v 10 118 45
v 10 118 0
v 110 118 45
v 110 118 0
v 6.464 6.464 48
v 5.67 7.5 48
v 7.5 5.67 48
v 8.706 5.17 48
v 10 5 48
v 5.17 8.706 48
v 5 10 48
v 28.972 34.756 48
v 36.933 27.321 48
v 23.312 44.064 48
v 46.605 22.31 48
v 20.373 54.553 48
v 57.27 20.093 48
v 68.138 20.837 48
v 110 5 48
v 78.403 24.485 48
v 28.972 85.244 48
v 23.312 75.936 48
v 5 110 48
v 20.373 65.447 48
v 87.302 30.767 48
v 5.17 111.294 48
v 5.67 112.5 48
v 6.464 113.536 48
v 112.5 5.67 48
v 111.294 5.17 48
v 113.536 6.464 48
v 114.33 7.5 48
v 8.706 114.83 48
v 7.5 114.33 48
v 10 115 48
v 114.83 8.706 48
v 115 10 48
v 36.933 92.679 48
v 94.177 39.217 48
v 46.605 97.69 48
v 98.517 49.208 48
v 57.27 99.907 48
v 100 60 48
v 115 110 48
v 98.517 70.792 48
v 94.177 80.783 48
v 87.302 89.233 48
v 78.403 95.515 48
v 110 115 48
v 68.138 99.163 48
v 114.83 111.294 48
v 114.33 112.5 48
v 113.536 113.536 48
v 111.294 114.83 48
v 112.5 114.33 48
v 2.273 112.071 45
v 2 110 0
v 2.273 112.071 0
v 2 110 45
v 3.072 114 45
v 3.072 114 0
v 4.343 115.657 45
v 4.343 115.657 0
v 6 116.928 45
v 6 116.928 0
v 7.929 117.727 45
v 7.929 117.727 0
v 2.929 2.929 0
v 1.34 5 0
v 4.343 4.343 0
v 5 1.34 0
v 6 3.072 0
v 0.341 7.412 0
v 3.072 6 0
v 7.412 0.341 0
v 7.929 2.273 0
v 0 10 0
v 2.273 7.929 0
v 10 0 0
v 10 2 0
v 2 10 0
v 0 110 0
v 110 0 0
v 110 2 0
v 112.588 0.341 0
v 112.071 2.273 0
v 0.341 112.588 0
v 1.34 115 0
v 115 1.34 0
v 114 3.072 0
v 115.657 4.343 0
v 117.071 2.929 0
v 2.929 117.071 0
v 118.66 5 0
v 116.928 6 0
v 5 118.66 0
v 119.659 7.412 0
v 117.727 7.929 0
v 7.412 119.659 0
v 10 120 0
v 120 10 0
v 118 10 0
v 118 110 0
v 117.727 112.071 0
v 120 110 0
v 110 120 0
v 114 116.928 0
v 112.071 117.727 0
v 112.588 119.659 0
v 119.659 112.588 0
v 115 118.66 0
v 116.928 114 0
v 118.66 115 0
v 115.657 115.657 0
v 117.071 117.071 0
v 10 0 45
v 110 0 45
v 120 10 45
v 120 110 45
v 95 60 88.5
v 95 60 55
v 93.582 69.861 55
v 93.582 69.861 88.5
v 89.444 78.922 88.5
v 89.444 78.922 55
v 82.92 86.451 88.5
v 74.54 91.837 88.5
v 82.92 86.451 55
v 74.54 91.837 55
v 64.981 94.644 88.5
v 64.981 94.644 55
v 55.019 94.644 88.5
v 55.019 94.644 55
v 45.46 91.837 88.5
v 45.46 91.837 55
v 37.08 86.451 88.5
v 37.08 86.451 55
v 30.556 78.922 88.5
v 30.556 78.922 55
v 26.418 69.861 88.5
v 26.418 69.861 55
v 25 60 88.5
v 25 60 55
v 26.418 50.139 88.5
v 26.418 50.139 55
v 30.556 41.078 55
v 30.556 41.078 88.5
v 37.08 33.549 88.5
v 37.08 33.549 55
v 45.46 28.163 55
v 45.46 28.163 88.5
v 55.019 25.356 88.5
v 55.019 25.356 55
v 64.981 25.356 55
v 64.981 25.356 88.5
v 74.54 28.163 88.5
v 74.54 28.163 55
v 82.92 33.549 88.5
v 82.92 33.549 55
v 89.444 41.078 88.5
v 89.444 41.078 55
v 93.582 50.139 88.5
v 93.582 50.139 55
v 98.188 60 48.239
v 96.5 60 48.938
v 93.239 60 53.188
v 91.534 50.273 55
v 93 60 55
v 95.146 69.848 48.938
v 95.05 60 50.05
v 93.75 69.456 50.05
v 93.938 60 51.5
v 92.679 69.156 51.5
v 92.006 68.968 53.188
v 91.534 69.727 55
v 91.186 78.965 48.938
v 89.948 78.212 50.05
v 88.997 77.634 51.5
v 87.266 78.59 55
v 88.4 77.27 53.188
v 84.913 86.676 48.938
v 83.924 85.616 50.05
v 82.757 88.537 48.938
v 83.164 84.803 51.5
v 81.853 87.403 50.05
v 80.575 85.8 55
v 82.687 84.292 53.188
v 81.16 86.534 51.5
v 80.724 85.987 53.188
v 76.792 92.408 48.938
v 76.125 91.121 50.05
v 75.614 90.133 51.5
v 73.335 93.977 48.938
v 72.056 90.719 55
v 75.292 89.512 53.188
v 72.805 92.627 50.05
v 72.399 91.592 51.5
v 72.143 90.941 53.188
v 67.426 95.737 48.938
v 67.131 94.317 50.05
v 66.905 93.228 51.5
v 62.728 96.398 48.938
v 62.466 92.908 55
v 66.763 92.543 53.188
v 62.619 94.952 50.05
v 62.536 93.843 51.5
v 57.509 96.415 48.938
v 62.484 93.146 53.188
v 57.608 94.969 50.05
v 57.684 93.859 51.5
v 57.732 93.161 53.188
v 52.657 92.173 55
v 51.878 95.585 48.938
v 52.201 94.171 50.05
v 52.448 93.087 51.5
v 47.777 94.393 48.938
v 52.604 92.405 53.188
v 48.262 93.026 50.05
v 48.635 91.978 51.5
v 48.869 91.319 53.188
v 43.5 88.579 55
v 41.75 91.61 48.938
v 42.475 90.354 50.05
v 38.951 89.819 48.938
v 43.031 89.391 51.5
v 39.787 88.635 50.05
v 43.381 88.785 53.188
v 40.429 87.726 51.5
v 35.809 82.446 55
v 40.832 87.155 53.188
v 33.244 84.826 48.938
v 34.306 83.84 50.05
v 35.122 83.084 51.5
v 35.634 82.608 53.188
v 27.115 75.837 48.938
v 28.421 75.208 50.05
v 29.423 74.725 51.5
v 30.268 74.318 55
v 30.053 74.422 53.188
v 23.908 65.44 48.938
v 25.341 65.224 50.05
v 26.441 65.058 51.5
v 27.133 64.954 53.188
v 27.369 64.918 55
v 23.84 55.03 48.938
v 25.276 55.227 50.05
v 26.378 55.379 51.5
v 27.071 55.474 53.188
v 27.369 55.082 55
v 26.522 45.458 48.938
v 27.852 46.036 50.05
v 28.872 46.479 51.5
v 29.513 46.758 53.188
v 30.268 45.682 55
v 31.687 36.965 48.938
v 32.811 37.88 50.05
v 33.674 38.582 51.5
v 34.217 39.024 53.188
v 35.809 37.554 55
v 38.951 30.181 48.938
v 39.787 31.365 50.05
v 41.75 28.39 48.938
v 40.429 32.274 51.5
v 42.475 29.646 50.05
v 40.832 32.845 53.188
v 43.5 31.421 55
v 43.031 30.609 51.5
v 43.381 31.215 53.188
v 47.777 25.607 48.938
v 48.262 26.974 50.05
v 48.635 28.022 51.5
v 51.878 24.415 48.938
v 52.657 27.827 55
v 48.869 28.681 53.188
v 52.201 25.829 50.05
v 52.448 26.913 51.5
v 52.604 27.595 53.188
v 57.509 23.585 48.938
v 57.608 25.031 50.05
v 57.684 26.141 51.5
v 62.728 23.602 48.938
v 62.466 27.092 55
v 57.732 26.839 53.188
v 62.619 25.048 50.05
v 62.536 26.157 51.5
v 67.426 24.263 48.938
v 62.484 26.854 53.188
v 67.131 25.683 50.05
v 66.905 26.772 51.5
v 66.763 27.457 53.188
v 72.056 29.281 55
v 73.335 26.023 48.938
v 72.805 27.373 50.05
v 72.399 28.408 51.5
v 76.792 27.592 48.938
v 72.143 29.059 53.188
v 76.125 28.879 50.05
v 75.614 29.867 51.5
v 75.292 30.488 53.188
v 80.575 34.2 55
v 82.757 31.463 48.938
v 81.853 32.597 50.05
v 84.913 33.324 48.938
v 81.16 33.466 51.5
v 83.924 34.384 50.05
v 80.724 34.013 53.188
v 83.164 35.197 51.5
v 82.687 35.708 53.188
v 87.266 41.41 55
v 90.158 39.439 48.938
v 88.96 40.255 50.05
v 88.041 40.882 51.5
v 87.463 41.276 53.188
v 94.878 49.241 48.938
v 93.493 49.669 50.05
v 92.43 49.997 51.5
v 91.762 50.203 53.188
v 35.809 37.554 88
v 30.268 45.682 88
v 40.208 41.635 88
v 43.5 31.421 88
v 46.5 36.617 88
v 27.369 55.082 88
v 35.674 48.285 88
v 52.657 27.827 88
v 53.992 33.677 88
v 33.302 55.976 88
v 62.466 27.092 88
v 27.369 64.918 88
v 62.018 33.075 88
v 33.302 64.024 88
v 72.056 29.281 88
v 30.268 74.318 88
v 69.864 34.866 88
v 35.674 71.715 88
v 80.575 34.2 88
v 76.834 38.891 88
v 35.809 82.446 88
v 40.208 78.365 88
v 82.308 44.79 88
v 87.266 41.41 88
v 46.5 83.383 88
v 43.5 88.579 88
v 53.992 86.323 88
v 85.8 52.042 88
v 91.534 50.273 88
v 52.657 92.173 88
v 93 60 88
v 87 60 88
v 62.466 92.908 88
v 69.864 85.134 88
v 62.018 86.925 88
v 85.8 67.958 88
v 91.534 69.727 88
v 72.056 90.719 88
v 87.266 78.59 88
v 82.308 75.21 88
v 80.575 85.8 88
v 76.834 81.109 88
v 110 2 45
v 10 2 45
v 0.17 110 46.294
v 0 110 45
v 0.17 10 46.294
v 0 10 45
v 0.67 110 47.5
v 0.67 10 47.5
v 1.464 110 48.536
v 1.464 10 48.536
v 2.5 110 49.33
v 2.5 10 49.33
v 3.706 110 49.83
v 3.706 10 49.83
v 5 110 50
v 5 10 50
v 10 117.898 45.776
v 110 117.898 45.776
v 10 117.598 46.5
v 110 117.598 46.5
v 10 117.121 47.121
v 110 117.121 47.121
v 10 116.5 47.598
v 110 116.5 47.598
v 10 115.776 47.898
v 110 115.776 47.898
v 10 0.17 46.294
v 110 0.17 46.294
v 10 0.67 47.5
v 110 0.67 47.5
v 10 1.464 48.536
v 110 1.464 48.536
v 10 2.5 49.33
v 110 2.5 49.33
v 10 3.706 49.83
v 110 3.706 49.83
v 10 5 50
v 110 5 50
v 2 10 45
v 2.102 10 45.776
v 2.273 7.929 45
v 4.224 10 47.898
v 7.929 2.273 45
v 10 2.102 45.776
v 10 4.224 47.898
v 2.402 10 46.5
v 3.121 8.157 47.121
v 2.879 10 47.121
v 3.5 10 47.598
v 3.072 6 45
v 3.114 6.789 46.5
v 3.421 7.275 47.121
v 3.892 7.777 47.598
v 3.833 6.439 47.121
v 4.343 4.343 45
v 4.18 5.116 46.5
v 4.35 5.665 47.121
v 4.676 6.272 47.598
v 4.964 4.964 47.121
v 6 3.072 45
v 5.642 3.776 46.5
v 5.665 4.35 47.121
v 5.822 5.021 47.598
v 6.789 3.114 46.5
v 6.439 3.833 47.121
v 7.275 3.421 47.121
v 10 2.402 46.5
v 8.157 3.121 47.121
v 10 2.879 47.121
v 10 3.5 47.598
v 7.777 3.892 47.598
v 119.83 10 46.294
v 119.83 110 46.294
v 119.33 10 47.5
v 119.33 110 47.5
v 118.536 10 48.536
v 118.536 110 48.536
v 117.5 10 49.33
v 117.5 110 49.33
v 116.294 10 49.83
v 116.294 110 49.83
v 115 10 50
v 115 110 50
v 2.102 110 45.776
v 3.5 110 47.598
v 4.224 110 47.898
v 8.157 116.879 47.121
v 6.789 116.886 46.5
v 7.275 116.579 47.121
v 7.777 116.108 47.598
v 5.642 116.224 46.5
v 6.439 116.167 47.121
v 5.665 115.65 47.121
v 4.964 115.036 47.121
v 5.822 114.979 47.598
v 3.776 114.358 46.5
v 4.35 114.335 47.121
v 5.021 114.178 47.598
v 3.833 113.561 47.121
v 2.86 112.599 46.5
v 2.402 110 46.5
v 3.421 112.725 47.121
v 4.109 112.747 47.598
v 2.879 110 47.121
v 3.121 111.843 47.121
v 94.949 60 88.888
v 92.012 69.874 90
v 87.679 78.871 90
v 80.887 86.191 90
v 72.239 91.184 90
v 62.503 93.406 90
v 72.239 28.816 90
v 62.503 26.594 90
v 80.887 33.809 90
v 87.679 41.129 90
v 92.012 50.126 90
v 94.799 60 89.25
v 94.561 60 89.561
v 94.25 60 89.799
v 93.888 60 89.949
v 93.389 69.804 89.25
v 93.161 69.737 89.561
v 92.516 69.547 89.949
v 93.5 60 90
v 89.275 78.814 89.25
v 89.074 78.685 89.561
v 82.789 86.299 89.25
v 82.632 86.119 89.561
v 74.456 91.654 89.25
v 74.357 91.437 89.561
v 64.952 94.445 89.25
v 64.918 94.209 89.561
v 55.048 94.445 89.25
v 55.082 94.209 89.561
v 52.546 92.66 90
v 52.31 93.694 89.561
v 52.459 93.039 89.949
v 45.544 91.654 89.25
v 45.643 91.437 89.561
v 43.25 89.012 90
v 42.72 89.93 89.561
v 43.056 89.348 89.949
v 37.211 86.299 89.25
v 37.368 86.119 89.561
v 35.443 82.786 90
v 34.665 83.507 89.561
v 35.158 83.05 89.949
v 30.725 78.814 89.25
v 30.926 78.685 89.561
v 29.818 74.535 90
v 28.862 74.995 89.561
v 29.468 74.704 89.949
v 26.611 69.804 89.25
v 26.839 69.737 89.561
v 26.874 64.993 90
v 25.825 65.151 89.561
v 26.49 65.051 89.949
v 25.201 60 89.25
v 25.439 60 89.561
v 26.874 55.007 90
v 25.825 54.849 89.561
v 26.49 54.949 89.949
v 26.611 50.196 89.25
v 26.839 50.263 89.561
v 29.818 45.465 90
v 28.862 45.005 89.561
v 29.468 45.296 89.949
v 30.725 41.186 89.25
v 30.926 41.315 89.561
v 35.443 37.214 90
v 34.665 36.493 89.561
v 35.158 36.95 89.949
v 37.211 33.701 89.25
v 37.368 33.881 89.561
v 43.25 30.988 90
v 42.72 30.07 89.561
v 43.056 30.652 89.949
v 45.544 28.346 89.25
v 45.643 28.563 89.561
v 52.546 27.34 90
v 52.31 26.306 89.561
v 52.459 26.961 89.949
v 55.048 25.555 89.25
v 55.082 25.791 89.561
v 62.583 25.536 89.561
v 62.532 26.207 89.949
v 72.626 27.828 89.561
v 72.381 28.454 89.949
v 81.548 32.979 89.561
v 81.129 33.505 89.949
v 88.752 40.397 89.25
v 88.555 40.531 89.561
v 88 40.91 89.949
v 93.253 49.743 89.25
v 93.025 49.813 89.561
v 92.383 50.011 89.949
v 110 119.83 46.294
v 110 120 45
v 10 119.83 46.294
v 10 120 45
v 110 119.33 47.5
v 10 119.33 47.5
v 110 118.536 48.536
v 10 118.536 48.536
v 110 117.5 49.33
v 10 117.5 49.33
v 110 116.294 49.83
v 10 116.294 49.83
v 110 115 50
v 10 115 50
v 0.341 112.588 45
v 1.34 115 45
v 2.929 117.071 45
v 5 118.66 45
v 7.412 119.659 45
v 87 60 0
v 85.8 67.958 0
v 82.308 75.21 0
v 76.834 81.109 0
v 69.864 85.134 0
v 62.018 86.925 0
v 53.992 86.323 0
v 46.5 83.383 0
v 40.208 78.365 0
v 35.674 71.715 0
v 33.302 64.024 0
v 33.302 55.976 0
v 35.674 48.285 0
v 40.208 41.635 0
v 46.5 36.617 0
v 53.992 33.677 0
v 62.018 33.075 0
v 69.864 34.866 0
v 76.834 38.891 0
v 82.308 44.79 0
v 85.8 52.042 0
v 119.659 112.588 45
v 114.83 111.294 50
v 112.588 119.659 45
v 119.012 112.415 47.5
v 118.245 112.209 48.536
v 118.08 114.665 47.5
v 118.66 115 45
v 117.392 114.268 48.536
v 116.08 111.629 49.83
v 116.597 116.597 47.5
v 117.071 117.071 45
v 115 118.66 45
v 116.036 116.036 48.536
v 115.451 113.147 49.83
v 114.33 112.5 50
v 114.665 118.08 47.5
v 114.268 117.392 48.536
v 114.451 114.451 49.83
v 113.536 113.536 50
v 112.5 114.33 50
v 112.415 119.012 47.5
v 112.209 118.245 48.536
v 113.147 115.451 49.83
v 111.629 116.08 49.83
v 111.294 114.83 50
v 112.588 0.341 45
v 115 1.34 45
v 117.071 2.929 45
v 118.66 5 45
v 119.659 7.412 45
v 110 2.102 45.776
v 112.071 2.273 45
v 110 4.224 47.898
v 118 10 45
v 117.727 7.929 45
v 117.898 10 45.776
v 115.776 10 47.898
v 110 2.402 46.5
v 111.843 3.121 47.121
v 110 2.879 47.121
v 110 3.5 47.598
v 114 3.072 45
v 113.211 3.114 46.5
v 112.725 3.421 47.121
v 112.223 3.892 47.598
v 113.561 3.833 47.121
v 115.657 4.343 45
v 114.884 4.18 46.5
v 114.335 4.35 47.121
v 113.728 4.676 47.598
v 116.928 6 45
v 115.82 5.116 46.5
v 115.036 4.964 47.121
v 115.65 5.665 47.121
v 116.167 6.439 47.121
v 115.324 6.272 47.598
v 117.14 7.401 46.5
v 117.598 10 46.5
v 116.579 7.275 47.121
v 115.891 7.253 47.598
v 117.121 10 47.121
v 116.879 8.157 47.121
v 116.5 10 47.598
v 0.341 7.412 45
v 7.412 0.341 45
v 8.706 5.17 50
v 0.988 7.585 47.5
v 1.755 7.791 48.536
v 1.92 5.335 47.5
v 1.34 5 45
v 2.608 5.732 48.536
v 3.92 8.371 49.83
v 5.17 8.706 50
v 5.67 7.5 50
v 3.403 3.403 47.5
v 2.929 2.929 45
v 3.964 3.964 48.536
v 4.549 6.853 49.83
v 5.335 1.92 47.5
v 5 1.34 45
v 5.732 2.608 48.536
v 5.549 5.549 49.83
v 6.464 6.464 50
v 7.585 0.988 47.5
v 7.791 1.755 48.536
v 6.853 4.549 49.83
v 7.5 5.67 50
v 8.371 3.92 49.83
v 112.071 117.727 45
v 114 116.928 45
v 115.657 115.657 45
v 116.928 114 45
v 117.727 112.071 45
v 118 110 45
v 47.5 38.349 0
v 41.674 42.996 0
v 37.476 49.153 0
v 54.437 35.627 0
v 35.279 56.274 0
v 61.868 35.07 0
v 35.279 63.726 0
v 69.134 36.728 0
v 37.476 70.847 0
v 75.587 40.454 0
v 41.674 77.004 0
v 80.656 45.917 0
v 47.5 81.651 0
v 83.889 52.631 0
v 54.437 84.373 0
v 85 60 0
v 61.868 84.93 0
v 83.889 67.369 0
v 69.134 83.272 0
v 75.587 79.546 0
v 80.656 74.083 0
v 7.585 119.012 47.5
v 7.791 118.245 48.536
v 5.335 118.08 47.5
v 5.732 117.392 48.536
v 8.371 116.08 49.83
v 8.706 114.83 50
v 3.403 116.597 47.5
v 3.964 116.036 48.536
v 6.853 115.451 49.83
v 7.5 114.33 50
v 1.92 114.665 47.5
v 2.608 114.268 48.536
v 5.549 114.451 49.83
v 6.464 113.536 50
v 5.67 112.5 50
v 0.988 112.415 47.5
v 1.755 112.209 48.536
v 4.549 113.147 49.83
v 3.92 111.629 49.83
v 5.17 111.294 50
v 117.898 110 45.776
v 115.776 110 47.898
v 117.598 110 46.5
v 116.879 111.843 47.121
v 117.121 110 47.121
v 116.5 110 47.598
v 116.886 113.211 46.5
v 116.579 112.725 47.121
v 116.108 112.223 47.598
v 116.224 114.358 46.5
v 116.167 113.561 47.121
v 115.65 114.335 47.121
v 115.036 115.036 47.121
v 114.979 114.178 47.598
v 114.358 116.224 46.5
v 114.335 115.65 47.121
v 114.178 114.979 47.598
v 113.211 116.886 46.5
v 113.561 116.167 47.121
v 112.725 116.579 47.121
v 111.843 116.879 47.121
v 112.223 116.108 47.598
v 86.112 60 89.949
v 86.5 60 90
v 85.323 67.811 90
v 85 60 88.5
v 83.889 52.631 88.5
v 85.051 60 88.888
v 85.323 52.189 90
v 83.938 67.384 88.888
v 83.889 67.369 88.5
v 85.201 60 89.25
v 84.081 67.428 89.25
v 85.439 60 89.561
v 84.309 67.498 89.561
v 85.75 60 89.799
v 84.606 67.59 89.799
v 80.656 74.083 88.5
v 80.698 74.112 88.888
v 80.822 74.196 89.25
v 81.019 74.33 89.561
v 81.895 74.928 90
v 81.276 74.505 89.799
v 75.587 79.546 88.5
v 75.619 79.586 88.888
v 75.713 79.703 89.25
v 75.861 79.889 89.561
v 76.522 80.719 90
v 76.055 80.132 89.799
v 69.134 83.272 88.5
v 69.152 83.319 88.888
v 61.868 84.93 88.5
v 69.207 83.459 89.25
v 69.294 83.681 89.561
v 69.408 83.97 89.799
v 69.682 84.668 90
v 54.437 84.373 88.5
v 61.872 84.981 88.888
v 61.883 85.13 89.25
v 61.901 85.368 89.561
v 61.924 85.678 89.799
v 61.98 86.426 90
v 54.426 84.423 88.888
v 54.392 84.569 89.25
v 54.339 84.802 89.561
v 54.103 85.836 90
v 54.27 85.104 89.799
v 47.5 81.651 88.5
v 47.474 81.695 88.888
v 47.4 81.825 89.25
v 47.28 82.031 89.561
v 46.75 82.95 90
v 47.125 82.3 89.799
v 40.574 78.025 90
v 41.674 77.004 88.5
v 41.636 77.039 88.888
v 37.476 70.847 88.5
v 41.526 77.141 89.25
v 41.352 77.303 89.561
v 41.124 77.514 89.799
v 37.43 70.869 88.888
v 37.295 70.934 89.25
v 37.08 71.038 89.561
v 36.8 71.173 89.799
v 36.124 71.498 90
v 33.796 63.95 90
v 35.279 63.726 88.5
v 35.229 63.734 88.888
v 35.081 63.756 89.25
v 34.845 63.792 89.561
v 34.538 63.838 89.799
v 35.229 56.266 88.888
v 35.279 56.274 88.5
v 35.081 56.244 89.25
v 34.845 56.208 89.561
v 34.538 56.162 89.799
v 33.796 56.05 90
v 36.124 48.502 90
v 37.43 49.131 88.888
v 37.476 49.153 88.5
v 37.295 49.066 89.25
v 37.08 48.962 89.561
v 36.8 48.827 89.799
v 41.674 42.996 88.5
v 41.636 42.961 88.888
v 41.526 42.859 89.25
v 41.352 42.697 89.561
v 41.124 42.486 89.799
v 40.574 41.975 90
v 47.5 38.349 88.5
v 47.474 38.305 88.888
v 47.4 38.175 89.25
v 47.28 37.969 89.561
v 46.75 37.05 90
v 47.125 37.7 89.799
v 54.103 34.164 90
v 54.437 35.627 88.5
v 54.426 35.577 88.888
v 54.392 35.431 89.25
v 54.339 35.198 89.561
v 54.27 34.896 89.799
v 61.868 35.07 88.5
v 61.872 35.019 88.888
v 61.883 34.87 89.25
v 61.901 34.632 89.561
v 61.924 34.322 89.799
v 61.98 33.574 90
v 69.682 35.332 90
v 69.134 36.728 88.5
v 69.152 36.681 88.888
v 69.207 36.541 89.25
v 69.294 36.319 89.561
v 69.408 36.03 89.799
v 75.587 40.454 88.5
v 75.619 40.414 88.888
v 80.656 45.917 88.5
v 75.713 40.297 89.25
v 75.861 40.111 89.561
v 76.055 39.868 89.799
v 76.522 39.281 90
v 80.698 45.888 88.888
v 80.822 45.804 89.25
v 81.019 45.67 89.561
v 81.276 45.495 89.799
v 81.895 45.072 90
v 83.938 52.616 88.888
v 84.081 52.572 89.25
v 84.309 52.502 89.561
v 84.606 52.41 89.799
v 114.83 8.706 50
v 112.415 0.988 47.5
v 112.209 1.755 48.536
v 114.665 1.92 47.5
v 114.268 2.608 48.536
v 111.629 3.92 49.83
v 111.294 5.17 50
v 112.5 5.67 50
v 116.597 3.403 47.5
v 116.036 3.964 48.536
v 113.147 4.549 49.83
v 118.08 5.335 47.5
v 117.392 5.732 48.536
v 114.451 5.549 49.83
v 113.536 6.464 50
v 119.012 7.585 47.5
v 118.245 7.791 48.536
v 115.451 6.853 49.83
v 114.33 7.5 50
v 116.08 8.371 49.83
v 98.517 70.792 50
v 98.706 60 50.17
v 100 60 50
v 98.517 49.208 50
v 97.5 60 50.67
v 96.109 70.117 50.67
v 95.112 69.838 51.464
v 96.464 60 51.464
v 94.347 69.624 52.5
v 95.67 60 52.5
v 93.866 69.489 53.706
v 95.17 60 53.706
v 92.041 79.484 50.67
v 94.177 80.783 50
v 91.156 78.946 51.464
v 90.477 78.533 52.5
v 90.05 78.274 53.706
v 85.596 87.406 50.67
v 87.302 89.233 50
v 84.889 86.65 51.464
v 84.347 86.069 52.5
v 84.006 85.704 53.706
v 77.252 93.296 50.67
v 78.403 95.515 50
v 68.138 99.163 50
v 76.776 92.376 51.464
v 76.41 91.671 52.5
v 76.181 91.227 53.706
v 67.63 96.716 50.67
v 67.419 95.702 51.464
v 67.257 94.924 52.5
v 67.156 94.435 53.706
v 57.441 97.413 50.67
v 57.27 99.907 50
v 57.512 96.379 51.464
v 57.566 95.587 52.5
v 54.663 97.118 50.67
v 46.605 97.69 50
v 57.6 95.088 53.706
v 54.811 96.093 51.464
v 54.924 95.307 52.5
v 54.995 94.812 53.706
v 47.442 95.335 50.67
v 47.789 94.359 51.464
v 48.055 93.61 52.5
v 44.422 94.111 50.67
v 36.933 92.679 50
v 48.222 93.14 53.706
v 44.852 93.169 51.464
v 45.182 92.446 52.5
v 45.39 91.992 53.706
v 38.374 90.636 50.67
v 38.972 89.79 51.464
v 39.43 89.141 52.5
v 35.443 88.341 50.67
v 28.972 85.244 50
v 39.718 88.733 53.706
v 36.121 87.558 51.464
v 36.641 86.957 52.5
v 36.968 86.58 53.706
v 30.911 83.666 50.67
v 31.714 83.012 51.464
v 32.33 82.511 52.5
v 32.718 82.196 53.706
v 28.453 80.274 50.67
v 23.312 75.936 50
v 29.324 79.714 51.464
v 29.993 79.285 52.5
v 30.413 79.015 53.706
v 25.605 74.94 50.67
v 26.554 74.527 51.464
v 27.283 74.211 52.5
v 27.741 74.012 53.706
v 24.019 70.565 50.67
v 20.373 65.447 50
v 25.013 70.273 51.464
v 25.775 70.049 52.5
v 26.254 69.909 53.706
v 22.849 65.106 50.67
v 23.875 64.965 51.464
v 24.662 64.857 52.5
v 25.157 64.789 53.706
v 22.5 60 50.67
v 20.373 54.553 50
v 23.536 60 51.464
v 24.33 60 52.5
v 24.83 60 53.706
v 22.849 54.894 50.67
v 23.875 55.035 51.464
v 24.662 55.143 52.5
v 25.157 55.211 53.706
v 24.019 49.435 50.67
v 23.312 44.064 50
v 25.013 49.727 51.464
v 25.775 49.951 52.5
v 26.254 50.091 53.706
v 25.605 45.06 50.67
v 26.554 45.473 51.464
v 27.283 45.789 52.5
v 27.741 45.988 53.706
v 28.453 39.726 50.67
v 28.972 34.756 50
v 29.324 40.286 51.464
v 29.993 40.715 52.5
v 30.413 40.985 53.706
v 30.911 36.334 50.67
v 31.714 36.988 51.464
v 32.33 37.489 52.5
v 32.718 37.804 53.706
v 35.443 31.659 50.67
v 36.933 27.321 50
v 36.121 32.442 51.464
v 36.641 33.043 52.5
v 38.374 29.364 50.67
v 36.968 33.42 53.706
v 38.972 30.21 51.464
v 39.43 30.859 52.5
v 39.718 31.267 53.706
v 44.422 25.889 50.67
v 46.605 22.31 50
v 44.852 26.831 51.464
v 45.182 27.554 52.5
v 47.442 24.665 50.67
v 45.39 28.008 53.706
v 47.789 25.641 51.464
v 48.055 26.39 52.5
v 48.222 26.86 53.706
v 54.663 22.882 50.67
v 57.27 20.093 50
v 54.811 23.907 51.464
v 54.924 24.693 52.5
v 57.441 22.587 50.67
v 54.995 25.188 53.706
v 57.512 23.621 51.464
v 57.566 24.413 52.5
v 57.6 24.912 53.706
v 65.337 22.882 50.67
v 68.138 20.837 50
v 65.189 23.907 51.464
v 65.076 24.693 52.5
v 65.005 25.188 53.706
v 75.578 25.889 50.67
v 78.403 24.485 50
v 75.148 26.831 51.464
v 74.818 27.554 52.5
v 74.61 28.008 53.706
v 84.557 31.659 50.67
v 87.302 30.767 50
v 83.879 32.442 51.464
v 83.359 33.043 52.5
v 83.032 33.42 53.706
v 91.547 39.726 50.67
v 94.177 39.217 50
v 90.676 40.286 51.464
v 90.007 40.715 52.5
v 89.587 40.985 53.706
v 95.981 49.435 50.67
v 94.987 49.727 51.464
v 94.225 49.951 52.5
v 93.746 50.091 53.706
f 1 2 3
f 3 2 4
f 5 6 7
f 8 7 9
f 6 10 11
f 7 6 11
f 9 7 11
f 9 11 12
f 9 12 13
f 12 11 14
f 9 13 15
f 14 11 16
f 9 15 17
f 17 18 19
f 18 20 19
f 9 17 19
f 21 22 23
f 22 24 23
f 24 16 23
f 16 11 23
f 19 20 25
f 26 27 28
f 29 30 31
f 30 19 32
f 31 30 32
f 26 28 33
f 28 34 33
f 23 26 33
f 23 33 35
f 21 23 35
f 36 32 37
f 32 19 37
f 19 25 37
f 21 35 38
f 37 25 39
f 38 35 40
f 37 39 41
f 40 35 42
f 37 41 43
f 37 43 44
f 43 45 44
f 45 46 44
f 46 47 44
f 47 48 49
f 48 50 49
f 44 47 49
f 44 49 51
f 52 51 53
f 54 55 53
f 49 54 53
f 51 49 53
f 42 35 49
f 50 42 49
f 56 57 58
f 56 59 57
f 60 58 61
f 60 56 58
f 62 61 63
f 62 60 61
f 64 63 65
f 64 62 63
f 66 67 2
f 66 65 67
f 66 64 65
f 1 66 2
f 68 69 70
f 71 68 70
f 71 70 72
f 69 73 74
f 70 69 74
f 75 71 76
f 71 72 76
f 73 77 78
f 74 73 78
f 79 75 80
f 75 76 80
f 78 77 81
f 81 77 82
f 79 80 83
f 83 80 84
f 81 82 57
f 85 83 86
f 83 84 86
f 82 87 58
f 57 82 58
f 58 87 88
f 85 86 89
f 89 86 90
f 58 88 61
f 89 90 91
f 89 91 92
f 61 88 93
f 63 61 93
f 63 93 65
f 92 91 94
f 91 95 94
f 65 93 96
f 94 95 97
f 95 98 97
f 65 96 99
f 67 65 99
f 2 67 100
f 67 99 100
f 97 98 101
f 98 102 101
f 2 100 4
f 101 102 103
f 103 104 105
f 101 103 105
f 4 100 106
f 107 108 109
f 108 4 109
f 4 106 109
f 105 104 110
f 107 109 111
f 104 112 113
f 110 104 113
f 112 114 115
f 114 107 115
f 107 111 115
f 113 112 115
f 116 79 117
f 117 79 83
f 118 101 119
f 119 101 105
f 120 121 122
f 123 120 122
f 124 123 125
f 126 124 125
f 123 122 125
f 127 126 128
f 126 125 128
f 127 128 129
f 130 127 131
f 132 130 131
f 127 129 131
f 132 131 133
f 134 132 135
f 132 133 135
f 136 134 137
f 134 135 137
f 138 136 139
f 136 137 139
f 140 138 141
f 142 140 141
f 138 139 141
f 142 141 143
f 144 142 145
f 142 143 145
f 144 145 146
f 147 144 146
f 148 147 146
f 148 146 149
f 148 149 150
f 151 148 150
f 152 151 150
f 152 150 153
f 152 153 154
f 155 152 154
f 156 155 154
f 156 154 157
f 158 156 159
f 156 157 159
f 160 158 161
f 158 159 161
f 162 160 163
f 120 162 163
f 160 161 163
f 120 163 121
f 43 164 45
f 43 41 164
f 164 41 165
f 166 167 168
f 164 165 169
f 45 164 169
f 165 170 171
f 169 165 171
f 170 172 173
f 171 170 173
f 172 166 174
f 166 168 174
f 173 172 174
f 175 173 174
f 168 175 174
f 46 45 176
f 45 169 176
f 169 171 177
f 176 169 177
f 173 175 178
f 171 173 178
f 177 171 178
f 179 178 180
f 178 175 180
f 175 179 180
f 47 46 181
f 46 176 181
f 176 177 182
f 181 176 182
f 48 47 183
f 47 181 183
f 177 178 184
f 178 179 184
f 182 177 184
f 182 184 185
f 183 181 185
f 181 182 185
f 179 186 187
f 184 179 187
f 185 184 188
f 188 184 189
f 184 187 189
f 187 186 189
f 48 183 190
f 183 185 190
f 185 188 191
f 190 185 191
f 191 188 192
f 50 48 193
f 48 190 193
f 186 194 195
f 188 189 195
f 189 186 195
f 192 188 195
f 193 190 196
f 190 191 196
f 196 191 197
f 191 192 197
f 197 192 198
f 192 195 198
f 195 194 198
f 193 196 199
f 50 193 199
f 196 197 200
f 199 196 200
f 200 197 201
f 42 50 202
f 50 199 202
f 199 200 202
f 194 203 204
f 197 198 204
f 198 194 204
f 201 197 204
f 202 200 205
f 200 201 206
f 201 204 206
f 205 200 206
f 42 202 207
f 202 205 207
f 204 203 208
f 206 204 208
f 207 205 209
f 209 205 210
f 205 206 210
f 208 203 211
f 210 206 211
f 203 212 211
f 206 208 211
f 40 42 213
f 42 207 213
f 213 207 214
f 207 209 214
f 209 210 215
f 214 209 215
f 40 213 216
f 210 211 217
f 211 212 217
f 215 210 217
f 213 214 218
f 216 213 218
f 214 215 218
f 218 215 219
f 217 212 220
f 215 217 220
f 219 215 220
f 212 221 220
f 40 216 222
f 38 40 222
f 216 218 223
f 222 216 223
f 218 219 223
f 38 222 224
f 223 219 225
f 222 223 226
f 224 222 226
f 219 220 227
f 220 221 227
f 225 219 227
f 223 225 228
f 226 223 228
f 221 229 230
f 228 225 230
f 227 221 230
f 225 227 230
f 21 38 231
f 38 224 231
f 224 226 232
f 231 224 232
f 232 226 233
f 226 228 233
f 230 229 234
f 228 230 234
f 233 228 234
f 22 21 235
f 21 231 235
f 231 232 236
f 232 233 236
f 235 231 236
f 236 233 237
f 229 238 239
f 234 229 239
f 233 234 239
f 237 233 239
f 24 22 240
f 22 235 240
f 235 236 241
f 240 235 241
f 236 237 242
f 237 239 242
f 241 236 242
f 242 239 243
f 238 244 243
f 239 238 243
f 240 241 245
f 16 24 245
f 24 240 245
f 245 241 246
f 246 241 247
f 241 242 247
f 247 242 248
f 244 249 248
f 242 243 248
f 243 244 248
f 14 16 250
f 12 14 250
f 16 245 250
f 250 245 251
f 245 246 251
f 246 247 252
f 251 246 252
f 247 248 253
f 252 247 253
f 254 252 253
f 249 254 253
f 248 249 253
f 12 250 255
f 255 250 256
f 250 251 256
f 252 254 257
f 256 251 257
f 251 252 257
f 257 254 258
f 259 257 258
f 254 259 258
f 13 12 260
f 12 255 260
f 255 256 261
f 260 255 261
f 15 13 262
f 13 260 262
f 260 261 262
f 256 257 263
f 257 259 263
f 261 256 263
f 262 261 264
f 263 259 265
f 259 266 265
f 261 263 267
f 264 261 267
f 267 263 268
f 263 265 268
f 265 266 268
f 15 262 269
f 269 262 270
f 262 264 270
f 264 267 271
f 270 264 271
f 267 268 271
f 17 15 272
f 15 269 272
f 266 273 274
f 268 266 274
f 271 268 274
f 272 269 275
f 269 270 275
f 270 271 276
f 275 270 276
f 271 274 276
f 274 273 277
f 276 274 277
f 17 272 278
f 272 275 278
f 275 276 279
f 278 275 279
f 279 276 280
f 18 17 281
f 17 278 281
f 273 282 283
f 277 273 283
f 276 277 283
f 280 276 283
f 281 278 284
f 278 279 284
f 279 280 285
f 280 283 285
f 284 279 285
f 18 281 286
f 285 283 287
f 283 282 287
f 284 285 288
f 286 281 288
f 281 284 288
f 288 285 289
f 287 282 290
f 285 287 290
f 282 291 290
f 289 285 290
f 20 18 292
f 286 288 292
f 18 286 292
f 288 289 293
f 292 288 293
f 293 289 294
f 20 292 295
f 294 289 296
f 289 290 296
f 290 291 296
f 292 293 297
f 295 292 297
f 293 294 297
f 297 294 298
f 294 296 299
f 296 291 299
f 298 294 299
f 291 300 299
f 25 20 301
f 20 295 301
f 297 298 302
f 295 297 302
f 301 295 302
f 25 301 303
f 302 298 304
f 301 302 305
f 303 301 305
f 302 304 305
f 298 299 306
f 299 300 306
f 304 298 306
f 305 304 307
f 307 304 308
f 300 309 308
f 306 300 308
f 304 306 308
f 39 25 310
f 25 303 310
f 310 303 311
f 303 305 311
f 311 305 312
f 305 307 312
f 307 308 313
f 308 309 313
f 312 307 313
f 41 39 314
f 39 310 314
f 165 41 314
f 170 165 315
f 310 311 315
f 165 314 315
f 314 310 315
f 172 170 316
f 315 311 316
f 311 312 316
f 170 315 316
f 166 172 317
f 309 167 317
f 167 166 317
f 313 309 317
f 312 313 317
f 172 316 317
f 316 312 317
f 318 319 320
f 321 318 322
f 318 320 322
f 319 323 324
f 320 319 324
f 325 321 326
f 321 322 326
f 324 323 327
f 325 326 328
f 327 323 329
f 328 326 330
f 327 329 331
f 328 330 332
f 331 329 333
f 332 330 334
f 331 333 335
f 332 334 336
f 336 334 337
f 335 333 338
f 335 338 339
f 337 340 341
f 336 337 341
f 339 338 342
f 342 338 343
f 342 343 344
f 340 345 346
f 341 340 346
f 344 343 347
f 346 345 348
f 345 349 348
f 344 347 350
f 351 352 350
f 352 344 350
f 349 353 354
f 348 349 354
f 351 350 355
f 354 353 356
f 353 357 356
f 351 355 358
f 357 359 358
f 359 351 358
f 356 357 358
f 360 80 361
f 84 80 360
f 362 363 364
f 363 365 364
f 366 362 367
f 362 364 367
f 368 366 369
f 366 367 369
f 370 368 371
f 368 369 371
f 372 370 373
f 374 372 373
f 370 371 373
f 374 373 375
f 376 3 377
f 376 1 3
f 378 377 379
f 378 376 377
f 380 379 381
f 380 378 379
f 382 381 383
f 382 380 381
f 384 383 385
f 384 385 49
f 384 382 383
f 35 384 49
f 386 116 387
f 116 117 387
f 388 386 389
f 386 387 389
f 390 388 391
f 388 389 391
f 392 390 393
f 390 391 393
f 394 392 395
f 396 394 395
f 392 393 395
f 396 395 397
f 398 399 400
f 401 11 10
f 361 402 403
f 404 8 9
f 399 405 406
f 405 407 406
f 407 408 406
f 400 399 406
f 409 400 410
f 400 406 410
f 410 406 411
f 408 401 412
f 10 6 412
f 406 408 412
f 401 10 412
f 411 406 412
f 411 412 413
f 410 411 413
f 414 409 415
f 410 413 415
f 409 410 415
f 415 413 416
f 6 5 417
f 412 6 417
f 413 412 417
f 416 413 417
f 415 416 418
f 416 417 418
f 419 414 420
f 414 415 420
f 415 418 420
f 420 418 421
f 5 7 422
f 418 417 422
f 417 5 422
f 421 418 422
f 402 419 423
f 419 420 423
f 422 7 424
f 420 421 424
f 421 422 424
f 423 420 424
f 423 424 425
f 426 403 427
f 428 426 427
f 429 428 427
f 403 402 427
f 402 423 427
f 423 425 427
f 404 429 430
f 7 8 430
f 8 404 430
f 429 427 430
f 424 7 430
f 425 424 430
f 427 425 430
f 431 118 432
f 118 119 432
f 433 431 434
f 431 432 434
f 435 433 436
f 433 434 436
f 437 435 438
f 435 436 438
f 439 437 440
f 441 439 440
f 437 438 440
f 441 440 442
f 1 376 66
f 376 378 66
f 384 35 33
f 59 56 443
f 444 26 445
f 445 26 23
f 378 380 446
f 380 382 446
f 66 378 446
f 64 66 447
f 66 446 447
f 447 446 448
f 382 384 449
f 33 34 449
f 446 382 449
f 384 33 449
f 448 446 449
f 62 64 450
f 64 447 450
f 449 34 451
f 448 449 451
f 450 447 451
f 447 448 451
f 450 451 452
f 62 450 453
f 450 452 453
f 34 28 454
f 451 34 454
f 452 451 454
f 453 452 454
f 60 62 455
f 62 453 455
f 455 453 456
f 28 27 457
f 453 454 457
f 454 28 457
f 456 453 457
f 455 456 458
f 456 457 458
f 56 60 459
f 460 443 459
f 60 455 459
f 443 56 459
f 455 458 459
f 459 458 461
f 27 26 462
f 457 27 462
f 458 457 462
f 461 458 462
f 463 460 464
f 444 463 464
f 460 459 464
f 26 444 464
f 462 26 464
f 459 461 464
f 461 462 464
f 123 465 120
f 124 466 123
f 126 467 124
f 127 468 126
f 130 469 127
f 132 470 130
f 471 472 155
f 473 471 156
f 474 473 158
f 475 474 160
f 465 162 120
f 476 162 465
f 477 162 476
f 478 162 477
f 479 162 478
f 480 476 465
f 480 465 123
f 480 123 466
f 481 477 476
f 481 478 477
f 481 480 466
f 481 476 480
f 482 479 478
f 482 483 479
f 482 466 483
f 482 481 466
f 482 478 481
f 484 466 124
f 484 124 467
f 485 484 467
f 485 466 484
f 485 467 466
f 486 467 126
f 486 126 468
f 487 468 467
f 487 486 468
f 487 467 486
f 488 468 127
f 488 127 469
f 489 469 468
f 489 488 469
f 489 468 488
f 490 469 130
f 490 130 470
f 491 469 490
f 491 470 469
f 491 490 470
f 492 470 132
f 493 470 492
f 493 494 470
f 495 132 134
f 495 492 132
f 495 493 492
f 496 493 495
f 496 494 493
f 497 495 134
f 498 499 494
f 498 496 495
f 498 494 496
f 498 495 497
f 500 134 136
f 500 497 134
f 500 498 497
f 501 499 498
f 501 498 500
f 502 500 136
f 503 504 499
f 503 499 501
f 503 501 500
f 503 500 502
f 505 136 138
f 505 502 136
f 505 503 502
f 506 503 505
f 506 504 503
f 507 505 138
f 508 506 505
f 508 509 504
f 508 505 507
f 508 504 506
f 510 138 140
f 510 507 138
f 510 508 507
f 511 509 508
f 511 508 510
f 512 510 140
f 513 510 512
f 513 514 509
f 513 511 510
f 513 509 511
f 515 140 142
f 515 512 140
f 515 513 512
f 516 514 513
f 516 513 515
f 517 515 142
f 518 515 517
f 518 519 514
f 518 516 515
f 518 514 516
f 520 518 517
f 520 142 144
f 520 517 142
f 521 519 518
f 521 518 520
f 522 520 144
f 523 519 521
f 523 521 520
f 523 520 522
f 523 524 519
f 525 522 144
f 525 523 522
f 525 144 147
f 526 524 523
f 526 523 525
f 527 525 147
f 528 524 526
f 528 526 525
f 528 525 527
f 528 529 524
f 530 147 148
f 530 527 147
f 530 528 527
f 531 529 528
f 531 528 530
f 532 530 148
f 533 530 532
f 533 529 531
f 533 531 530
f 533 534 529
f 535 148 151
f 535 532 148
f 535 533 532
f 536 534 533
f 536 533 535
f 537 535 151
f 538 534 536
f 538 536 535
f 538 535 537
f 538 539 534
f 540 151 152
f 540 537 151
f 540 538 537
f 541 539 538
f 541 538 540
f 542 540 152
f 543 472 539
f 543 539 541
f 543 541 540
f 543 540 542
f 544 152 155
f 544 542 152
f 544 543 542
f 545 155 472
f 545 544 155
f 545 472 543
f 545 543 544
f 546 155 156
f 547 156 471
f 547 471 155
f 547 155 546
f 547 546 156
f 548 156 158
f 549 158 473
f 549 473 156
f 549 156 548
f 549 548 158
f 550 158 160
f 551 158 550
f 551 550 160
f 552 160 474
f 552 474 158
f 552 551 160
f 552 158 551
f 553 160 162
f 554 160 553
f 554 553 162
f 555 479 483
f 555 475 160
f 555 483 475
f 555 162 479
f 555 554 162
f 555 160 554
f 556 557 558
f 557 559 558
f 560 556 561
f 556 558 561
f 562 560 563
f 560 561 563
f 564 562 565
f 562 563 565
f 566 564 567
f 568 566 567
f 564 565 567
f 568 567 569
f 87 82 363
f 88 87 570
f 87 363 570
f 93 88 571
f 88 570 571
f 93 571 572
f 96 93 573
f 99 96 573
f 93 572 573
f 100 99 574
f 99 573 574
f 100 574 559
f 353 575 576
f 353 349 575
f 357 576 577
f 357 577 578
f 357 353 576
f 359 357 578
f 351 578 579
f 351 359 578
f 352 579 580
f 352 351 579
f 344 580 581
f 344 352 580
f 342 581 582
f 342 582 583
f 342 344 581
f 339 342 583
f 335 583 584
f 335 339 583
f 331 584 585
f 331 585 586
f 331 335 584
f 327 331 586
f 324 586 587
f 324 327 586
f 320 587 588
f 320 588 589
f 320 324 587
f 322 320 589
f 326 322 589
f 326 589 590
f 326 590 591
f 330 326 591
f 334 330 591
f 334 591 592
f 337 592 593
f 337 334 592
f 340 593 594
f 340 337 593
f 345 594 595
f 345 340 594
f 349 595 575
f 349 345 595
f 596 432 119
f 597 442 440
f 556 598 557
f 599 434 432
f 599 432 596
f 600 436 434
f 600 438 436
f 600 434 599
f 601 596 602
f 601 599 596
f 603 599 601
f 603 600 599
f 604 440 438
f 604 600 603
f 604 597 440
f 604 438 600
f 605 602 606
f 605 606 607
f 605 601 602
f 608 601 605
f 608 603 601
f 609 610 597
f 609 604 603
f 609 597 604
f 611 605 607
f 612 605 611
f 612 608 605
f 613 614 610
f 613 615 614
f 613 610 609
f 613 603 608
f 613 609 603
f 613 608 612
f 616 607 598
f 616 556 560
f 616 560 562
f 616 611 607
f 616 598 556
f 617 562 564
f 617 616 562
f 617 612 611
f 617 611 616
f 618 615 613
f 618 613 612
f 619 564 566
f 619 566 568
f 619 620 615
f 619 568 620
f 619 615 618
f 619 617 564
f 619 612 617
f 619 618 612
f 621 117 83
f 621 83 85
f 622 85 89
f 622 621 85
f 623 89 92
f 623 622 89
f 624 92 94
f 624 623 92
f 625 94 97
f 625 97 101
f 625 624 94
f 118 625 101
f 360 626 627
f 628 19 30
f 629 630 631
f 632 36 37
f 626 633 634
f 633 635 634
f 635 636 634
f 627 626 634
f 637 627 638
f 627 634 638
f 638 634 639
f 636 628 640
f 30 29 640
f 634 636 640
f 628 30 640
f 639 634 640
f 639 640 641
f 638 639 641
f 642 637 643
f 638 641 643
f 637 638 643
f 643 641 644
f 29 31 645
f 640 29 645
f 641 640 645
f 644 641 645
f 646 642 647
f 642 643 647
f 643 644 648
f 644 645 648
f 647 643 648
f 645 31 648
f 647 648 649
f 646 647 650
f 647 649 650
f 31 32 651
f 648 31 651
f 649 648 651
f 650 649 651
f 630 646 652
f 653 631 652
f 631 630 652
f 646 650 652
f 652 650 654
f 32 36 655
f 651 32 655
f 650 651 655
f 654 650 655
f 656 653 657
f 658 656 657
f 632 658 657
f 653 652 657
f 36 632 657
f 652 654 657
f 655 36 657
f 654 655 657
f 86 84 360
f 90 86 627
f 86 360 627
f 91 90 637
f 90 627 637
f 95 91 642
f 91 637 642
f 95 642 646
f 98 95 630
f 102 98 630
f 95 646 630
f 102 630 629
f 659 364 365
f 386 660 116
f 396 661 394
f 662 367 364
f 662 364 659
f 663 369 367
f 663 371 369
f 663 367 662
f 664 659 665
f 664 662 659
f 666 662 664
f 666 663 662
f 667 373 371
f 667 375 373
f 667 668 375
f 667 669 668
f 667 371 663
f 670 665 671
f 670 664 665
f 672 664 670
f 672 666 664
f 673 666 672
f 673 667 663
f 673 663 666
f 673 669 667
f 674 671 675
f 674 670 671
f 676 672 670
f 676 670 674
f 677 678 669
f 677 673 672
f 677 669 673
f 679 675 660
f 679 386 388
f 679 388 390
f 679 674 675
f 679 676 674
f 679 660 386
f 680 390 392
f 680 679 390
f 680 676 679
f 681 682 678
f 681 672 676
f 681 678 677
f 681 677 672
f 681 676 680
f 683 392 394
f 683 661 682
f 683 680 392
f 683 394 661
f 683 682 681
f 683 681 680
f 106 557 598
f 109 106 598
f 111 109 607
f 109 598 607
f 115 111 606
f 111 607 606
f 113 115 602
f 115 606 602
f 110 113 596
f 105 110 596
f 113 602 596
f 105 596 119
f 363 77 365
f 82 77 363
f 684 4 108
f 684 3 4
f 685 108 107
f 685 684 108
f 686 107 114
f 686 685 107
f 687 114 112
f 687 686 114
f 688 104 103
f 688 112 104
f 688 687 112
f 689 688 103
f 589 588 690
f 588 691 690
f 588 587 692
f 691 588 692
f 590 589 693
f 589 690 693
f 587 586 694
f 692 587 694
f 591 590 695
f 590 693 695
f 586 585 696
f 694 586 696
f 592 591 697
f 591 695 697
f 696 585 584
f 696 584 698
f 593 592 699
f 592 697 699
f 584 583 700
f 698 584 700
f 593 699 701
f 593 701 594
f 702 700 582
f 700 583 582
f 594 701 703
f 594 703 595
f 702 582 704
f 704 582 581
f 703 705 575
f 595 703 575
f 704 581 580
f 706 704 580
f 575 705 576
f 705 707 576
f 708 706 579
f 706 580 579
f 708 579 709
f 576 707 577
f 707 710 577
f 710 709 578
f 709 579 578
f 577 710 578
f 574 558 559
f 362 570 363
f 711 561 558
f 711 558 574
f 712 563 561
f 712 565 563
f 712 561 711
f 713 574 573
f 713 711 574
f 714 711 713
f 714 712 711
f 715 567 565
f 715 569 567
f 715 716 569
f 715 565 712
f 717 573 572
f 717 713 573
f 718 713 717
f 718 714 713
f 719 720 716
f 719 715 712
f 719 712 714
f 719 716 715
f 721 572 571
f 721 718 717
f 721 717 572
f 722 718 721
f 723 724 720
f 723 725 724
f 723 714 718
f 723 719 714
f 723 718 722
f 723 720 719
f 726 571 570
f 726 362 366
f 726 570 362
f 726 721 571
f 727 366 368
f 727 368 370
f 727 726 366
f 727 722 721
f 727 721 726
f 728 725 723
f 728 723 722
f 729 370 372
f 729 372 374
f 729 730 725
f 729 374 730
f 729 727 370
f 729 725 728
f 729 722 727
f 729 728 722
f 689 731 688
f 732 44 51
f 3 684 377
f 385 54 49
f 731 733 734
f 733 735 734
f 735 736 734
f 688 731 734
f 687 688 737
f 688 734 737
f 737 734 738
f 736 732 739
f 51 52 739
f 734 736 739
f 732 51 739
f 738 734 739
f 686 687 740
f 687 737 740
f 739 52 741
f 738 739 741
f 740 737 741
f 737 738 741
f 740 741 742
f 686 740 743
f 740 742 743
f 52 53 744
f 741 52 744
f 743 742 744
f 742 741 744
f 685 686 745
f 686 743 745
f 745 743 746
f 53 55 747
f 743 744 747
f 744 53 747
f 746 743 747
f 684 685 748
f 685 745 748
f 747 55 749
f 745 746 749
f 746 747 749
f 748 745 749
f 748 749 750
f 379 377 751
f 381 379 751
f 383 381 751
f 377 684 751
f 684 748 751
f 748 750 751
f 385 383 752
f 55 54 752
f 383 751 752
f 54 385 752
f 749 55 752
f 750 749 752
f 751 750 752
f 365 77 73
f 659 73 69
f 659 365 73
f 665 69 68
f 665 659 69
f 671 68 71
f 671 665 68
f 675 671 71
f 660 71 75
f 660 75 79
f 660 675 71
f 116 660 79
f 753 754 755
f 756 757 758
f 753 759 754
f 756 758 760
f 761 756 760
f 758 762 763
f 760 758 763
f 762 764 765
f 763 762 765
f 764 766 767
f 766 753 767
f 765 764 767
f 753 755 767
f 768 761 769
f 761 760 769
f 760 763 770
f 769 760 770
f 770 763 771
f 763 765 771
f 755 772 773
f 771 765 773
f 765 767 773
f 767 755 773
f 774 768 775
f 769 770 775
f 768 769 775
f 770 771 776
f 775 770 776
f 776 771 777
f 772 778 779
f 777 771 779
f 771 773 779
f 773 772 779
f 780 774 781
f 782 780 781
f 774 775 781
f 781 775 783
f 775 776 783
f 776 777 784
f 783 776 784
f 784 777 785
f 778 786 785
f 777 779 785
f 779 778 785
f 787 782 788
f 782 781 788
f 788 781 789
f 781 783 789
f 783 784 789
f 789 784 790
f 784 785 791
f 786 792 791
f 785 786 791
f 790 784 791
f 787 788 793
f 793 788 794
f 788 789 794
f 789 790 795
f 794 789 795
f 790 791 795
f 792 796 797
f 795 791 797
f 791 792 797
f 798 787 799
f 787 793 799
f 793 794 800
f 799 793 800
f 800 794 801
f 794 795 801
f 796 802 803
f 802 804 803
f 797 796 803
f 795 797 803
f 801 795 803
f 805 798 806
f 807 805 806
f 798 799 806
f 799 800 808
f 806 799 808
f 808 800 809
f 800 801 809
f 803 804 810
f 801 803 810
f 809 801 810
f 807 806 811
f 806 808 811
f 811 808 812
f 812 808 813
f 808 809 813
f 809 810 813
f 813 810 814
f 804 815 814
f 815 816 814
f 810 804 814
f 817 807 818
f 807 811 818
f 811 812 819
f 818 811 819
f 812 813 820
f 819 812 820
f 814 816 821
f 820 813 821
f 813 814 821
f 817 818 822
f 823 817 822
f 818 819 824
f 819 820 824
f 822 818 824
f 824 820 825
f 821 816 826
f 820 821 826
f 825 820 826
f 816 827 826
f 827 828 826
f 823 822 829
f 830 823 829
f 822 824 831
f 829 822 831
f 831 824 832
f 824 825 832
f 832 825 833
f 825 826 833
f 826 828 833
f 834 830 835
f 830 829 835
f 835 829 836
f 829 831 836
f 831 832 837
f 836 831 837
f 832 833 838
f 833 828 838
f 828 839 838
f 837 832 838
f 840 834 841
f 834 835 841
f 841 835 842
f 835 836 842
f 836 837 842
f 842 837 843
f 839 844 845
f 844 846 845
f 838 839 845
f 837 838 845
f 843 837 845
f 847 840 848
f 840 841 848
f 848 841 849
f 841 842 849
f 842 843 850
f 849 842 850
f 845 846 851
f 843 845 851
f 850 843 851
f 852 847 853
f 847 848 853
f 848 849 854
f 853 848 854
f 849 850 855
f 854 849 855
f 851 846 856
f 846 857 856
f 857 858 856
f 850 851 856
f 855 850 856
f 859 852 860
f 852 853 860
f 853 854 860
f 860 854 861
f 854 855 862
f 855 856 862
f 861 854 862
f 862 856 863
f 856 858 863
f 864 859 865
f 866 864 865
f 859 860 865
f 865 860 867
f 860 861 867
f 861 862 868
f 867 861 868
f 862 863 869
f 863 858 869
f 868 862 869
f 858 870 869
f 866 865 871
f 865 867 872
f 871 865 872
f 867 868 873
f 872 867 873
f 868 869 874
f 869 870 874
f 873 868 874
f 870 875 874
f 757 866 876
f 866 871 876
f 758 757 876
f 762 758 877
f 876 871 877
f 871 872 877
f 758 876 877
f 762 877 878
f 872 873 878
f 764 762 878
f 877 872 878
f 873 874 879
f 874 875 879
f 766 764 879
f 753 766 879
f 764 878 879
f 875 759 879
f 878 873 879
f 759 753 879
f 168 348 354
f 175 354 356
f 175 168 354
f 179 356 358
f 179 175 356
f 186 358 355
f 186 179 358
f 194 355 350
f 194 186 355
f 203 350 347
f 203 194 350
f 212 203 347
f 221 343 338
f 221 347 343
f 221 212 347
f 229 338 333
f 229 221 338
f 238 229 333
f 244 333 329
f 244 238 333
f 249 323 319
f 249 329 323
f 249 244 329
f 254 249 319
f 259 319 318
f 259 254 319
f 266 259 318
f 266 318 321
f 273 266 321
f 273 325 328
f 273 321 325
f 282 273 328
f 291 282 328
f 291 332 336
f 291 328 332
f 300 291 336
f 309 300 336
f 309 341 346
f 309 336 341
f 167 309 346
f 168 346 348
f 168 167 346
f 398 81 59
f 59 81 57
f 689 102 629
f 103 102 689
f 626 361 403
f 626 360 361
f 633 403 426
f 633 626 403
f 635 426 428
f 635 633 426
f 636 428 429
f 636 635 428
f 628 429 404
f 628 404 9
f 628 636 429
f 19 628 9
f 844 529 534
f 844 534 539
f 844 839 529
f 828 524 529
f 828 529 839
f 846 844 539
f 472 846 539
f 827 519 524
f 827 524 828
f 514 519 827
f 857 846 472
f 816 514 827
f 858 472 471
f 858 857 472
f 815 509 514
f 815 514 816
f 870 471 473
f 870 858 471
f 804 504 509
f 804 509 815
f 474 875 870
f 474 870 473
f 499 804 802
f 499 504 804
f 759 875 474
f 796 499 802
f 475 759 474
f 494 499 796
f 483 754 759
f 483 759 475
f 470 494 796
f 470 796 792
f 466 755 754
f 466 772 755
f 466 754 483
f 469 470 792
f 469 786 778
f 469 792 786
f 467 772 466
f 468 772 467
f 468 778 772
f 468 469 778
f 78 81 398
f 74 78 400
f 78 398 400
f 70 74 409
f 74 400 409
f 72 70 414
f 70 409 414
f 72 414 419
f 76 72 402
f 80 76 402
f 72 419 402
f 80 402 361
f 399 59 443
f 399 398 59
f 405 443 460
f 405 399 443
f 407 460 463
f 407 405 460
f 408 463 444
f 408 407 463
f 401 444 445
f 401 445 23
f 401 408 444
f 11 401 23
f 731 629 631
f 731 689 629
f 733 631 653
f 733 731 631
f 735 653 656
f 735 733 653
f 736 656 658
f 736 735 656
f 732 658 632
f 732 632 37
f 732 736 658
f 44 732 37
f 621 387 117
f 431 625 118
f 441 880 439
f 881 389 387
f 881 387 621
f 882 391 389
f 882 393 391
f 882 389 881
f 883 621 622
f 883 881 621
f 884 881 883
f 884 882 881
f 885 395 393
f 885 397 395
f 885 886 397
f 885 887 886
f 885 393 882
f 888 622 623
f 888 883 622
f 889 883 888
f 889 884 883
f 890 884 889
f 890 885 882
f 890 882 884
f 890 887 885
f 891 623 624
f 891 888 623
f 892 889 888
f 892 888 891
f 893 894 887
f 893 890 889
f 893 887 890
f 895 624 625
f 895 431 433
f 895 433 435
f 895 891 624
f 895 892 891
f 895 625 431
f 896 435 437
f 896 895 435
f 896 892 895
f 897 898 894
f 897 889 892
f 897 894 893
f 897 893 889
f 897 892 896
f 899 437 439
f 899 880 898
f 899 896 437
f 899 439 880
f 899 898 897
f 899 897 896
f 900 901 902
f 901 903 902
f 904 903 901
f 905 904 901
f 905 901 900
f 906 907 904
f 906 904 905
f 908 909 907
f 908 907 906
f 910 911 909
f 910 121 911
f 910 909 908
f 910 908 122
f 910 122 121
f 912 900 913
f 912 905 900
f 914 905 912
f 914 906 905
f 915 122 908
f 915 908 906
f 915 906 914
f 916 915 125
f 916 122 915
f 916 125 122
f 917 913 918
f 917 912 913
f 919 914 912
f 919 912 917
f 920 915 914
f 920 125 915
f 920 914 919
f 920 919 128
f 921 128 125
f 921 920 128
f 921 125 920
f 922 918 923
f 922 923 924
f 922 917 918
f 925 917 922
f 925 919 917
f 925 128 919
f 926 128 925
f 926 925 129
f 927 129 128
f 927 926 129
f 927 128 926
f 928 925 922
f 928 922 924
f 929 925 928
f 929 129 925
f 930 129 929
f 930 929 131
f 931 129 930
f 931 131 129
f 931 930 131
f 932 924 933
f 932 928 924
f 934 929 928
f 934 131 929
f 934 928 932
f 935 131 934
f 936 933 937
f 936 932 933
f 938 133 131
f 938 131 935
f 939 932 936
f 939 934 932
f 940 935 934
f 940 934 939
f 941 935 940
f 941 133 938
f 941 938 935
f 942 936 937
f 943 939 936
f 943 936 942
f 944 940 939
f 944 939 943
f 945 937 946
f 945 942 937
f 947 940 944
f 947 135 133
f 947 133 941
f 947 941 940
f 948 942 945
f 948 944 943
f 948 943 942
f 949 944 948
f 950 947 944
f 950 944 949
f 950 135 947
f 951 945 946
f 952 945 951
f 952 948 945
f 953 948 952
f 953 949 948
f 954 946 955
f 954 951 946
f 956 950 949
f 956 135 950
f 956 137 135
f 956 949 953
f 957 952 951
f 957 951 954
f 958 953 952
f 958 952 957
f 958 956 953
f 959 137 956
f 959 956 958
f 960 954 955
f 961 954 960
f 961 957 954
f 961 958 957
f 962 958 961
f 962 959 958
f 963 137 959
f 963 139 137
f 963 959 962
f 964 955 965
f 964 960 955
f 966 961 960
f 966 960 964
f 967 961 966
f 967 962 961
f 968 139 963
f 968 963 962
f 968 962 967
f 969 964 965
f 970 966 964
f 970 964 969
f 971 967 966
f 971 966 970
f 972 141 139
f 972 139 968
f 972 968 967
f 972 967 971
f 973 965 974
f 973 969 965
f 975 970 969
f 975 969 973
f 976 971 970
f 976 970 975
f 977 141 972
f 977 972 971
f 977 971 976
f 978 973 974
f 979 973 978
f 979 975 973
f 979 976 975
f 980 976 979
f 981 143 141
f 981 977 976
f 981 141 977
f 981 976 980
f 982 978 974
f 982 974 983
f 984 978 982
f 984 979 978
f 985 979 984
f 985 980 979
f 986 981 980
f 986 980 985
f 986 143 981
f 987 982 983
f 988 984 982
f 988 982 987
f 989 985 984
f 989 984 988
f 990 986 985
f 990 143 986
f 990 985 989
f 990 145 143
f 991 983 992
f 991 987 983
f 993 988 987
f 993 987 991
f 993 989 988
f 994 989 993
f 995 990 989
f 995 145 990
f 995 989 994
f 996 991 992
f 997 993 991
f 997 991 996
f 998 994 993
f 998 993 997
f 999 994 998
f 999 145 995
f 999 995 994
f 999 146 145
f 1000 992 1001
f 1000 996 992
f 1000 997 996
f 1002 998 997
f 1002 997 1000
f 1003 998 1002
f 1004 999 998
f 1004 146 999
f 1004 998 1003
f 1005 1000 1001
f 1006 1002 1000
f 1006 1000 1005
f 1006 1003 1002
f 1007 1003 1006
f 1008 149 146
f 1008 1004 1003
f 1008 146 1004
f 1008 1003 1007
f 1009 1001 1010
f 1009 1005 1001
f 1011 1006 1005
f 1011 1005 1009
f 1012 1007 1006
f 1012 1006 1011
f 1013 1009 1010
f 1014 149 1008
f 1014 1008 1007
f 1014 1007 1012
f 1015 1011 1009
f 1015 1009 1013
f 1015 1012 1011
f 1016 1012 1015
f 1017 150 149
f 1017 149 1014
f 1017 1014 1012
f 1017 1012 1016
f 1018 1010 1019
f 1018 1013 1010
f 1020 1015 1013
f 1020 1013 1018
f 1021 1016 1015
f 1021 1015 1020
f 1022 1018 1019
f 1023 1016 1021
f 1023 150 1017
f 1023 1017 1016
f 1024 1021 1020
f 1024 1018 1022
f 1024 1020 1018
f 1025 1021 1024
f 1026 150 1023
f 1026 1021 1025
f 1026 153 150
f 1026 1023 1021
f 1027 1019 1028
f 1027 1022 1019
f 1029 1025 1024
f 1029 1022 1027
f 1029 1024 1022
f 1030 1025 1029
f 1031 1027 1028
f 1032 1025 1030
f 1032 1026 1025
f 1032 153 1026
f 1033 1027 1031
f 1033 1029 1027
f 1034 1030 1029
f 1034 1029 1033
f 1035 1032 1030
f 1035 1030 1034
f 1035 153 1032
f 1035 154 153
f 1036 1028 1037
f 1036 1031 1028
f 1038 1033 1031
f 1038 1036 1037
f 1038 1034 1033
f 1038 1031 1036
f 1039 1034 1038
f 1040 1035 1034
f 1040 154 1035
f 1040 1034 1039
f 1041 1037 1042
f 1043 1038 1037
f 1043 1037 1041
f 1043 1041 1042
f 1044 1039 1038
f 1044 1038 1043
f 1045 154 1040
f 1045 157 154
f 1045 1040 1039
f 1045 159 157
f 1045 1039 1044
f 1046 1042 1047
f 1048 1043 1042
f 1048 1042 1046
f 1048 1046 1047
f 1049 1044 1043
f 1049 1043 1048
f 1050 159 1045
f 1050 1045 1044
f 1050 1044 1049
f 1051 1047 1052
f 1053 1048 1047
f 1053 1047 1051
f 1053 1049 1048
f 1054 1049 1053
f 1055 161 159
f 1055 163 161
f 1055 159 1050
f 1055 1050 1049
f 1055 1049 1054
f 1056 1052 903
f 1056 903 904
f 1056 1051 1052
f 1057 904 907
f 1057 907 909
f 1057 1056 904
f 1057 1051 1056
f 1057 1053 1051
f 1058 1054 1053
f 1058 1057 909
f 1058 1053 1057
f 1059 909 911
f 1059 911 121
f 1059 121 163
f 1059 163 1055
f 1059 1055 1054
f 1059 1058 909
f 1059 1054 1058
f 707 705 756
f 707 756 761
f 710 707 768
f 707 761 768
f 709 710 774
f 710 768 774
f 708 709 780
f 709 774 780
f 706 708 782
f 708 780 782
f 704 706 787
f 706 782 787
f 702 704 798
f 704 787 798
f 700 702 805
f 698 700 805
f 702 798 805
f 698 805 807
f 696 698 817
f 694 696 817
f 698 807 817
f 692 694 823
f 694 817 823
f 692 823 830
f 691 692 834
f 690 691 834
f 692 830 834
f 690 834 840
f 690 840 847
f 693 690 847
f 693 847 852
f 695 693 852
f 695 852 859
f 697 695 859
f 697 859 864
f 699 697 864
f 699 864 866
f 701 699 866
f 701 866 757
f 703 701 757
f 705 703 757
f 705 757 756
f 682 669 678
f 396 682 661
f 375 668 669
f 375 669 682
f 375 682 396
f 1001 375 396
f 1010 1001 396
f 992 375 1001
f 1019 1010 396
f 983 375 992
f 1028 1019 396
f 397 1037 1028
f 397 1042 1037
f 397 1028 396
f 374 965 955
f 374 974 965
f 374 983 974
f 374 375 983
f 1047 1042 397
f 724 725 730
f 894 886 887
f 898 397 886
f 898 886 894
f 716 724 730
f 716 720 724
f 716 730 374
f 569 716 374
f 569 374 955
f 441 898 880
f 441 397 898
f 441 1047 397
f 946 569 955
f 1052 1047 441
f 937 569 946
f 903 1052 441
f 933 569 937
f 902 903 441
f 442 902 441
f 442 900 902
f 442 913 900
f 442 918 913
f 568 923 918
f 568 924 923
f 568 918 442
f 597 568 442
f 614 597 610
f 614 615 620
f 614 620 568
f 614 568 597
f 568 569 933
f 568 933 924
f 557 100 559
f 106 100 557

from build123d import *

# Parameters (mm, degrees)
SKETCH2_W           = 120
SKETCH2_H           = 120
BOSS_EXTRUDE1_DEPTH = 50
SKETCH4_R           = 35
BOSS_EXTRUDE2_DEPTH = 40
SKETCH6_R           = 25
CUT_EXTRUDE1_DEPTH  = 91
FILLET1_R           = 10
FILLET2_R           = 1.5
FILLET3_R           = 5
SHELL1_T            = -2


with BuildPart() as part:
    # Sketch2 → Boss-Extrude1 (new body)
    with BuildSketch(Plane.XY):
        with Locations((60, 60)):
            Rectangle(SKETCH2_W, SKETCH2_H)
    extrude(amount=BOSS_EXTRUDE1_DEPTH)

    # Sketch4 → Boss-Extrude2 (add)
    with BuildSketch(Plane.XY.offset(50)):
        with Locations((60, 60)):
            Circle(SKETCH4_R)
    extrude(amount=BOSS_EXTRUDE2_DEPTH)

    # Sketch6 → Cut-Extrude1 (cut, through all)
    with BuildSketch(Plane.XY.offset(90)):
        with Locations((60, 60)):
            Circle(SKETCH6_R)
    extrude(amount=-CUT_EXTRUDE1_DEPTH, mode=Mode.SUBTRACT)

    # Fillet1
    fillet1_edges = [part.edges().sort_by_distance(p)[0] for p in [
        (0, 120, 25),
        (120, 120, 25),
        (120, 0, 25),
        (0, 0, 25),
    ]]
    fillet(fillet1_edges, radius=FILLET1_R)

    # Fillet2
    fillet2_edges = [part.edges().sort_by_distance(p)[0] for p in [
        (25, 60, 90),
        (35, 60, 90),
    ]]
    fillet(fillet2_edges, radius=FILLET2_R)

    # Fillet3
    fillet3_edges = [part.edges().sort_by_distance(p)[0] for p in [
        (25, 60, 50),
        (60, 0, 50),
        (0, 60, 50),
        (120, 60, 50),
        (60, 120, 50),
        (2.928932188, 117.071067812, 50),
        (117.071067812, 117.071067812, 50),
        (117.071067812, 2.928932188, 50),
        (2.928932188, 2.928932188, 50),
    ]]
    fillet(fillet3_edges, radius=FILLET3_R)

    # Shell1
    shell1_openings = [part.faces().sort_by_distance(p)[0] for p in [
        (85, 60, 0),
    ]]
    offset(amount=SHELL1_T, openings=shell1_openings, kind=Kind.INTERSECTION)


solid = part.part
